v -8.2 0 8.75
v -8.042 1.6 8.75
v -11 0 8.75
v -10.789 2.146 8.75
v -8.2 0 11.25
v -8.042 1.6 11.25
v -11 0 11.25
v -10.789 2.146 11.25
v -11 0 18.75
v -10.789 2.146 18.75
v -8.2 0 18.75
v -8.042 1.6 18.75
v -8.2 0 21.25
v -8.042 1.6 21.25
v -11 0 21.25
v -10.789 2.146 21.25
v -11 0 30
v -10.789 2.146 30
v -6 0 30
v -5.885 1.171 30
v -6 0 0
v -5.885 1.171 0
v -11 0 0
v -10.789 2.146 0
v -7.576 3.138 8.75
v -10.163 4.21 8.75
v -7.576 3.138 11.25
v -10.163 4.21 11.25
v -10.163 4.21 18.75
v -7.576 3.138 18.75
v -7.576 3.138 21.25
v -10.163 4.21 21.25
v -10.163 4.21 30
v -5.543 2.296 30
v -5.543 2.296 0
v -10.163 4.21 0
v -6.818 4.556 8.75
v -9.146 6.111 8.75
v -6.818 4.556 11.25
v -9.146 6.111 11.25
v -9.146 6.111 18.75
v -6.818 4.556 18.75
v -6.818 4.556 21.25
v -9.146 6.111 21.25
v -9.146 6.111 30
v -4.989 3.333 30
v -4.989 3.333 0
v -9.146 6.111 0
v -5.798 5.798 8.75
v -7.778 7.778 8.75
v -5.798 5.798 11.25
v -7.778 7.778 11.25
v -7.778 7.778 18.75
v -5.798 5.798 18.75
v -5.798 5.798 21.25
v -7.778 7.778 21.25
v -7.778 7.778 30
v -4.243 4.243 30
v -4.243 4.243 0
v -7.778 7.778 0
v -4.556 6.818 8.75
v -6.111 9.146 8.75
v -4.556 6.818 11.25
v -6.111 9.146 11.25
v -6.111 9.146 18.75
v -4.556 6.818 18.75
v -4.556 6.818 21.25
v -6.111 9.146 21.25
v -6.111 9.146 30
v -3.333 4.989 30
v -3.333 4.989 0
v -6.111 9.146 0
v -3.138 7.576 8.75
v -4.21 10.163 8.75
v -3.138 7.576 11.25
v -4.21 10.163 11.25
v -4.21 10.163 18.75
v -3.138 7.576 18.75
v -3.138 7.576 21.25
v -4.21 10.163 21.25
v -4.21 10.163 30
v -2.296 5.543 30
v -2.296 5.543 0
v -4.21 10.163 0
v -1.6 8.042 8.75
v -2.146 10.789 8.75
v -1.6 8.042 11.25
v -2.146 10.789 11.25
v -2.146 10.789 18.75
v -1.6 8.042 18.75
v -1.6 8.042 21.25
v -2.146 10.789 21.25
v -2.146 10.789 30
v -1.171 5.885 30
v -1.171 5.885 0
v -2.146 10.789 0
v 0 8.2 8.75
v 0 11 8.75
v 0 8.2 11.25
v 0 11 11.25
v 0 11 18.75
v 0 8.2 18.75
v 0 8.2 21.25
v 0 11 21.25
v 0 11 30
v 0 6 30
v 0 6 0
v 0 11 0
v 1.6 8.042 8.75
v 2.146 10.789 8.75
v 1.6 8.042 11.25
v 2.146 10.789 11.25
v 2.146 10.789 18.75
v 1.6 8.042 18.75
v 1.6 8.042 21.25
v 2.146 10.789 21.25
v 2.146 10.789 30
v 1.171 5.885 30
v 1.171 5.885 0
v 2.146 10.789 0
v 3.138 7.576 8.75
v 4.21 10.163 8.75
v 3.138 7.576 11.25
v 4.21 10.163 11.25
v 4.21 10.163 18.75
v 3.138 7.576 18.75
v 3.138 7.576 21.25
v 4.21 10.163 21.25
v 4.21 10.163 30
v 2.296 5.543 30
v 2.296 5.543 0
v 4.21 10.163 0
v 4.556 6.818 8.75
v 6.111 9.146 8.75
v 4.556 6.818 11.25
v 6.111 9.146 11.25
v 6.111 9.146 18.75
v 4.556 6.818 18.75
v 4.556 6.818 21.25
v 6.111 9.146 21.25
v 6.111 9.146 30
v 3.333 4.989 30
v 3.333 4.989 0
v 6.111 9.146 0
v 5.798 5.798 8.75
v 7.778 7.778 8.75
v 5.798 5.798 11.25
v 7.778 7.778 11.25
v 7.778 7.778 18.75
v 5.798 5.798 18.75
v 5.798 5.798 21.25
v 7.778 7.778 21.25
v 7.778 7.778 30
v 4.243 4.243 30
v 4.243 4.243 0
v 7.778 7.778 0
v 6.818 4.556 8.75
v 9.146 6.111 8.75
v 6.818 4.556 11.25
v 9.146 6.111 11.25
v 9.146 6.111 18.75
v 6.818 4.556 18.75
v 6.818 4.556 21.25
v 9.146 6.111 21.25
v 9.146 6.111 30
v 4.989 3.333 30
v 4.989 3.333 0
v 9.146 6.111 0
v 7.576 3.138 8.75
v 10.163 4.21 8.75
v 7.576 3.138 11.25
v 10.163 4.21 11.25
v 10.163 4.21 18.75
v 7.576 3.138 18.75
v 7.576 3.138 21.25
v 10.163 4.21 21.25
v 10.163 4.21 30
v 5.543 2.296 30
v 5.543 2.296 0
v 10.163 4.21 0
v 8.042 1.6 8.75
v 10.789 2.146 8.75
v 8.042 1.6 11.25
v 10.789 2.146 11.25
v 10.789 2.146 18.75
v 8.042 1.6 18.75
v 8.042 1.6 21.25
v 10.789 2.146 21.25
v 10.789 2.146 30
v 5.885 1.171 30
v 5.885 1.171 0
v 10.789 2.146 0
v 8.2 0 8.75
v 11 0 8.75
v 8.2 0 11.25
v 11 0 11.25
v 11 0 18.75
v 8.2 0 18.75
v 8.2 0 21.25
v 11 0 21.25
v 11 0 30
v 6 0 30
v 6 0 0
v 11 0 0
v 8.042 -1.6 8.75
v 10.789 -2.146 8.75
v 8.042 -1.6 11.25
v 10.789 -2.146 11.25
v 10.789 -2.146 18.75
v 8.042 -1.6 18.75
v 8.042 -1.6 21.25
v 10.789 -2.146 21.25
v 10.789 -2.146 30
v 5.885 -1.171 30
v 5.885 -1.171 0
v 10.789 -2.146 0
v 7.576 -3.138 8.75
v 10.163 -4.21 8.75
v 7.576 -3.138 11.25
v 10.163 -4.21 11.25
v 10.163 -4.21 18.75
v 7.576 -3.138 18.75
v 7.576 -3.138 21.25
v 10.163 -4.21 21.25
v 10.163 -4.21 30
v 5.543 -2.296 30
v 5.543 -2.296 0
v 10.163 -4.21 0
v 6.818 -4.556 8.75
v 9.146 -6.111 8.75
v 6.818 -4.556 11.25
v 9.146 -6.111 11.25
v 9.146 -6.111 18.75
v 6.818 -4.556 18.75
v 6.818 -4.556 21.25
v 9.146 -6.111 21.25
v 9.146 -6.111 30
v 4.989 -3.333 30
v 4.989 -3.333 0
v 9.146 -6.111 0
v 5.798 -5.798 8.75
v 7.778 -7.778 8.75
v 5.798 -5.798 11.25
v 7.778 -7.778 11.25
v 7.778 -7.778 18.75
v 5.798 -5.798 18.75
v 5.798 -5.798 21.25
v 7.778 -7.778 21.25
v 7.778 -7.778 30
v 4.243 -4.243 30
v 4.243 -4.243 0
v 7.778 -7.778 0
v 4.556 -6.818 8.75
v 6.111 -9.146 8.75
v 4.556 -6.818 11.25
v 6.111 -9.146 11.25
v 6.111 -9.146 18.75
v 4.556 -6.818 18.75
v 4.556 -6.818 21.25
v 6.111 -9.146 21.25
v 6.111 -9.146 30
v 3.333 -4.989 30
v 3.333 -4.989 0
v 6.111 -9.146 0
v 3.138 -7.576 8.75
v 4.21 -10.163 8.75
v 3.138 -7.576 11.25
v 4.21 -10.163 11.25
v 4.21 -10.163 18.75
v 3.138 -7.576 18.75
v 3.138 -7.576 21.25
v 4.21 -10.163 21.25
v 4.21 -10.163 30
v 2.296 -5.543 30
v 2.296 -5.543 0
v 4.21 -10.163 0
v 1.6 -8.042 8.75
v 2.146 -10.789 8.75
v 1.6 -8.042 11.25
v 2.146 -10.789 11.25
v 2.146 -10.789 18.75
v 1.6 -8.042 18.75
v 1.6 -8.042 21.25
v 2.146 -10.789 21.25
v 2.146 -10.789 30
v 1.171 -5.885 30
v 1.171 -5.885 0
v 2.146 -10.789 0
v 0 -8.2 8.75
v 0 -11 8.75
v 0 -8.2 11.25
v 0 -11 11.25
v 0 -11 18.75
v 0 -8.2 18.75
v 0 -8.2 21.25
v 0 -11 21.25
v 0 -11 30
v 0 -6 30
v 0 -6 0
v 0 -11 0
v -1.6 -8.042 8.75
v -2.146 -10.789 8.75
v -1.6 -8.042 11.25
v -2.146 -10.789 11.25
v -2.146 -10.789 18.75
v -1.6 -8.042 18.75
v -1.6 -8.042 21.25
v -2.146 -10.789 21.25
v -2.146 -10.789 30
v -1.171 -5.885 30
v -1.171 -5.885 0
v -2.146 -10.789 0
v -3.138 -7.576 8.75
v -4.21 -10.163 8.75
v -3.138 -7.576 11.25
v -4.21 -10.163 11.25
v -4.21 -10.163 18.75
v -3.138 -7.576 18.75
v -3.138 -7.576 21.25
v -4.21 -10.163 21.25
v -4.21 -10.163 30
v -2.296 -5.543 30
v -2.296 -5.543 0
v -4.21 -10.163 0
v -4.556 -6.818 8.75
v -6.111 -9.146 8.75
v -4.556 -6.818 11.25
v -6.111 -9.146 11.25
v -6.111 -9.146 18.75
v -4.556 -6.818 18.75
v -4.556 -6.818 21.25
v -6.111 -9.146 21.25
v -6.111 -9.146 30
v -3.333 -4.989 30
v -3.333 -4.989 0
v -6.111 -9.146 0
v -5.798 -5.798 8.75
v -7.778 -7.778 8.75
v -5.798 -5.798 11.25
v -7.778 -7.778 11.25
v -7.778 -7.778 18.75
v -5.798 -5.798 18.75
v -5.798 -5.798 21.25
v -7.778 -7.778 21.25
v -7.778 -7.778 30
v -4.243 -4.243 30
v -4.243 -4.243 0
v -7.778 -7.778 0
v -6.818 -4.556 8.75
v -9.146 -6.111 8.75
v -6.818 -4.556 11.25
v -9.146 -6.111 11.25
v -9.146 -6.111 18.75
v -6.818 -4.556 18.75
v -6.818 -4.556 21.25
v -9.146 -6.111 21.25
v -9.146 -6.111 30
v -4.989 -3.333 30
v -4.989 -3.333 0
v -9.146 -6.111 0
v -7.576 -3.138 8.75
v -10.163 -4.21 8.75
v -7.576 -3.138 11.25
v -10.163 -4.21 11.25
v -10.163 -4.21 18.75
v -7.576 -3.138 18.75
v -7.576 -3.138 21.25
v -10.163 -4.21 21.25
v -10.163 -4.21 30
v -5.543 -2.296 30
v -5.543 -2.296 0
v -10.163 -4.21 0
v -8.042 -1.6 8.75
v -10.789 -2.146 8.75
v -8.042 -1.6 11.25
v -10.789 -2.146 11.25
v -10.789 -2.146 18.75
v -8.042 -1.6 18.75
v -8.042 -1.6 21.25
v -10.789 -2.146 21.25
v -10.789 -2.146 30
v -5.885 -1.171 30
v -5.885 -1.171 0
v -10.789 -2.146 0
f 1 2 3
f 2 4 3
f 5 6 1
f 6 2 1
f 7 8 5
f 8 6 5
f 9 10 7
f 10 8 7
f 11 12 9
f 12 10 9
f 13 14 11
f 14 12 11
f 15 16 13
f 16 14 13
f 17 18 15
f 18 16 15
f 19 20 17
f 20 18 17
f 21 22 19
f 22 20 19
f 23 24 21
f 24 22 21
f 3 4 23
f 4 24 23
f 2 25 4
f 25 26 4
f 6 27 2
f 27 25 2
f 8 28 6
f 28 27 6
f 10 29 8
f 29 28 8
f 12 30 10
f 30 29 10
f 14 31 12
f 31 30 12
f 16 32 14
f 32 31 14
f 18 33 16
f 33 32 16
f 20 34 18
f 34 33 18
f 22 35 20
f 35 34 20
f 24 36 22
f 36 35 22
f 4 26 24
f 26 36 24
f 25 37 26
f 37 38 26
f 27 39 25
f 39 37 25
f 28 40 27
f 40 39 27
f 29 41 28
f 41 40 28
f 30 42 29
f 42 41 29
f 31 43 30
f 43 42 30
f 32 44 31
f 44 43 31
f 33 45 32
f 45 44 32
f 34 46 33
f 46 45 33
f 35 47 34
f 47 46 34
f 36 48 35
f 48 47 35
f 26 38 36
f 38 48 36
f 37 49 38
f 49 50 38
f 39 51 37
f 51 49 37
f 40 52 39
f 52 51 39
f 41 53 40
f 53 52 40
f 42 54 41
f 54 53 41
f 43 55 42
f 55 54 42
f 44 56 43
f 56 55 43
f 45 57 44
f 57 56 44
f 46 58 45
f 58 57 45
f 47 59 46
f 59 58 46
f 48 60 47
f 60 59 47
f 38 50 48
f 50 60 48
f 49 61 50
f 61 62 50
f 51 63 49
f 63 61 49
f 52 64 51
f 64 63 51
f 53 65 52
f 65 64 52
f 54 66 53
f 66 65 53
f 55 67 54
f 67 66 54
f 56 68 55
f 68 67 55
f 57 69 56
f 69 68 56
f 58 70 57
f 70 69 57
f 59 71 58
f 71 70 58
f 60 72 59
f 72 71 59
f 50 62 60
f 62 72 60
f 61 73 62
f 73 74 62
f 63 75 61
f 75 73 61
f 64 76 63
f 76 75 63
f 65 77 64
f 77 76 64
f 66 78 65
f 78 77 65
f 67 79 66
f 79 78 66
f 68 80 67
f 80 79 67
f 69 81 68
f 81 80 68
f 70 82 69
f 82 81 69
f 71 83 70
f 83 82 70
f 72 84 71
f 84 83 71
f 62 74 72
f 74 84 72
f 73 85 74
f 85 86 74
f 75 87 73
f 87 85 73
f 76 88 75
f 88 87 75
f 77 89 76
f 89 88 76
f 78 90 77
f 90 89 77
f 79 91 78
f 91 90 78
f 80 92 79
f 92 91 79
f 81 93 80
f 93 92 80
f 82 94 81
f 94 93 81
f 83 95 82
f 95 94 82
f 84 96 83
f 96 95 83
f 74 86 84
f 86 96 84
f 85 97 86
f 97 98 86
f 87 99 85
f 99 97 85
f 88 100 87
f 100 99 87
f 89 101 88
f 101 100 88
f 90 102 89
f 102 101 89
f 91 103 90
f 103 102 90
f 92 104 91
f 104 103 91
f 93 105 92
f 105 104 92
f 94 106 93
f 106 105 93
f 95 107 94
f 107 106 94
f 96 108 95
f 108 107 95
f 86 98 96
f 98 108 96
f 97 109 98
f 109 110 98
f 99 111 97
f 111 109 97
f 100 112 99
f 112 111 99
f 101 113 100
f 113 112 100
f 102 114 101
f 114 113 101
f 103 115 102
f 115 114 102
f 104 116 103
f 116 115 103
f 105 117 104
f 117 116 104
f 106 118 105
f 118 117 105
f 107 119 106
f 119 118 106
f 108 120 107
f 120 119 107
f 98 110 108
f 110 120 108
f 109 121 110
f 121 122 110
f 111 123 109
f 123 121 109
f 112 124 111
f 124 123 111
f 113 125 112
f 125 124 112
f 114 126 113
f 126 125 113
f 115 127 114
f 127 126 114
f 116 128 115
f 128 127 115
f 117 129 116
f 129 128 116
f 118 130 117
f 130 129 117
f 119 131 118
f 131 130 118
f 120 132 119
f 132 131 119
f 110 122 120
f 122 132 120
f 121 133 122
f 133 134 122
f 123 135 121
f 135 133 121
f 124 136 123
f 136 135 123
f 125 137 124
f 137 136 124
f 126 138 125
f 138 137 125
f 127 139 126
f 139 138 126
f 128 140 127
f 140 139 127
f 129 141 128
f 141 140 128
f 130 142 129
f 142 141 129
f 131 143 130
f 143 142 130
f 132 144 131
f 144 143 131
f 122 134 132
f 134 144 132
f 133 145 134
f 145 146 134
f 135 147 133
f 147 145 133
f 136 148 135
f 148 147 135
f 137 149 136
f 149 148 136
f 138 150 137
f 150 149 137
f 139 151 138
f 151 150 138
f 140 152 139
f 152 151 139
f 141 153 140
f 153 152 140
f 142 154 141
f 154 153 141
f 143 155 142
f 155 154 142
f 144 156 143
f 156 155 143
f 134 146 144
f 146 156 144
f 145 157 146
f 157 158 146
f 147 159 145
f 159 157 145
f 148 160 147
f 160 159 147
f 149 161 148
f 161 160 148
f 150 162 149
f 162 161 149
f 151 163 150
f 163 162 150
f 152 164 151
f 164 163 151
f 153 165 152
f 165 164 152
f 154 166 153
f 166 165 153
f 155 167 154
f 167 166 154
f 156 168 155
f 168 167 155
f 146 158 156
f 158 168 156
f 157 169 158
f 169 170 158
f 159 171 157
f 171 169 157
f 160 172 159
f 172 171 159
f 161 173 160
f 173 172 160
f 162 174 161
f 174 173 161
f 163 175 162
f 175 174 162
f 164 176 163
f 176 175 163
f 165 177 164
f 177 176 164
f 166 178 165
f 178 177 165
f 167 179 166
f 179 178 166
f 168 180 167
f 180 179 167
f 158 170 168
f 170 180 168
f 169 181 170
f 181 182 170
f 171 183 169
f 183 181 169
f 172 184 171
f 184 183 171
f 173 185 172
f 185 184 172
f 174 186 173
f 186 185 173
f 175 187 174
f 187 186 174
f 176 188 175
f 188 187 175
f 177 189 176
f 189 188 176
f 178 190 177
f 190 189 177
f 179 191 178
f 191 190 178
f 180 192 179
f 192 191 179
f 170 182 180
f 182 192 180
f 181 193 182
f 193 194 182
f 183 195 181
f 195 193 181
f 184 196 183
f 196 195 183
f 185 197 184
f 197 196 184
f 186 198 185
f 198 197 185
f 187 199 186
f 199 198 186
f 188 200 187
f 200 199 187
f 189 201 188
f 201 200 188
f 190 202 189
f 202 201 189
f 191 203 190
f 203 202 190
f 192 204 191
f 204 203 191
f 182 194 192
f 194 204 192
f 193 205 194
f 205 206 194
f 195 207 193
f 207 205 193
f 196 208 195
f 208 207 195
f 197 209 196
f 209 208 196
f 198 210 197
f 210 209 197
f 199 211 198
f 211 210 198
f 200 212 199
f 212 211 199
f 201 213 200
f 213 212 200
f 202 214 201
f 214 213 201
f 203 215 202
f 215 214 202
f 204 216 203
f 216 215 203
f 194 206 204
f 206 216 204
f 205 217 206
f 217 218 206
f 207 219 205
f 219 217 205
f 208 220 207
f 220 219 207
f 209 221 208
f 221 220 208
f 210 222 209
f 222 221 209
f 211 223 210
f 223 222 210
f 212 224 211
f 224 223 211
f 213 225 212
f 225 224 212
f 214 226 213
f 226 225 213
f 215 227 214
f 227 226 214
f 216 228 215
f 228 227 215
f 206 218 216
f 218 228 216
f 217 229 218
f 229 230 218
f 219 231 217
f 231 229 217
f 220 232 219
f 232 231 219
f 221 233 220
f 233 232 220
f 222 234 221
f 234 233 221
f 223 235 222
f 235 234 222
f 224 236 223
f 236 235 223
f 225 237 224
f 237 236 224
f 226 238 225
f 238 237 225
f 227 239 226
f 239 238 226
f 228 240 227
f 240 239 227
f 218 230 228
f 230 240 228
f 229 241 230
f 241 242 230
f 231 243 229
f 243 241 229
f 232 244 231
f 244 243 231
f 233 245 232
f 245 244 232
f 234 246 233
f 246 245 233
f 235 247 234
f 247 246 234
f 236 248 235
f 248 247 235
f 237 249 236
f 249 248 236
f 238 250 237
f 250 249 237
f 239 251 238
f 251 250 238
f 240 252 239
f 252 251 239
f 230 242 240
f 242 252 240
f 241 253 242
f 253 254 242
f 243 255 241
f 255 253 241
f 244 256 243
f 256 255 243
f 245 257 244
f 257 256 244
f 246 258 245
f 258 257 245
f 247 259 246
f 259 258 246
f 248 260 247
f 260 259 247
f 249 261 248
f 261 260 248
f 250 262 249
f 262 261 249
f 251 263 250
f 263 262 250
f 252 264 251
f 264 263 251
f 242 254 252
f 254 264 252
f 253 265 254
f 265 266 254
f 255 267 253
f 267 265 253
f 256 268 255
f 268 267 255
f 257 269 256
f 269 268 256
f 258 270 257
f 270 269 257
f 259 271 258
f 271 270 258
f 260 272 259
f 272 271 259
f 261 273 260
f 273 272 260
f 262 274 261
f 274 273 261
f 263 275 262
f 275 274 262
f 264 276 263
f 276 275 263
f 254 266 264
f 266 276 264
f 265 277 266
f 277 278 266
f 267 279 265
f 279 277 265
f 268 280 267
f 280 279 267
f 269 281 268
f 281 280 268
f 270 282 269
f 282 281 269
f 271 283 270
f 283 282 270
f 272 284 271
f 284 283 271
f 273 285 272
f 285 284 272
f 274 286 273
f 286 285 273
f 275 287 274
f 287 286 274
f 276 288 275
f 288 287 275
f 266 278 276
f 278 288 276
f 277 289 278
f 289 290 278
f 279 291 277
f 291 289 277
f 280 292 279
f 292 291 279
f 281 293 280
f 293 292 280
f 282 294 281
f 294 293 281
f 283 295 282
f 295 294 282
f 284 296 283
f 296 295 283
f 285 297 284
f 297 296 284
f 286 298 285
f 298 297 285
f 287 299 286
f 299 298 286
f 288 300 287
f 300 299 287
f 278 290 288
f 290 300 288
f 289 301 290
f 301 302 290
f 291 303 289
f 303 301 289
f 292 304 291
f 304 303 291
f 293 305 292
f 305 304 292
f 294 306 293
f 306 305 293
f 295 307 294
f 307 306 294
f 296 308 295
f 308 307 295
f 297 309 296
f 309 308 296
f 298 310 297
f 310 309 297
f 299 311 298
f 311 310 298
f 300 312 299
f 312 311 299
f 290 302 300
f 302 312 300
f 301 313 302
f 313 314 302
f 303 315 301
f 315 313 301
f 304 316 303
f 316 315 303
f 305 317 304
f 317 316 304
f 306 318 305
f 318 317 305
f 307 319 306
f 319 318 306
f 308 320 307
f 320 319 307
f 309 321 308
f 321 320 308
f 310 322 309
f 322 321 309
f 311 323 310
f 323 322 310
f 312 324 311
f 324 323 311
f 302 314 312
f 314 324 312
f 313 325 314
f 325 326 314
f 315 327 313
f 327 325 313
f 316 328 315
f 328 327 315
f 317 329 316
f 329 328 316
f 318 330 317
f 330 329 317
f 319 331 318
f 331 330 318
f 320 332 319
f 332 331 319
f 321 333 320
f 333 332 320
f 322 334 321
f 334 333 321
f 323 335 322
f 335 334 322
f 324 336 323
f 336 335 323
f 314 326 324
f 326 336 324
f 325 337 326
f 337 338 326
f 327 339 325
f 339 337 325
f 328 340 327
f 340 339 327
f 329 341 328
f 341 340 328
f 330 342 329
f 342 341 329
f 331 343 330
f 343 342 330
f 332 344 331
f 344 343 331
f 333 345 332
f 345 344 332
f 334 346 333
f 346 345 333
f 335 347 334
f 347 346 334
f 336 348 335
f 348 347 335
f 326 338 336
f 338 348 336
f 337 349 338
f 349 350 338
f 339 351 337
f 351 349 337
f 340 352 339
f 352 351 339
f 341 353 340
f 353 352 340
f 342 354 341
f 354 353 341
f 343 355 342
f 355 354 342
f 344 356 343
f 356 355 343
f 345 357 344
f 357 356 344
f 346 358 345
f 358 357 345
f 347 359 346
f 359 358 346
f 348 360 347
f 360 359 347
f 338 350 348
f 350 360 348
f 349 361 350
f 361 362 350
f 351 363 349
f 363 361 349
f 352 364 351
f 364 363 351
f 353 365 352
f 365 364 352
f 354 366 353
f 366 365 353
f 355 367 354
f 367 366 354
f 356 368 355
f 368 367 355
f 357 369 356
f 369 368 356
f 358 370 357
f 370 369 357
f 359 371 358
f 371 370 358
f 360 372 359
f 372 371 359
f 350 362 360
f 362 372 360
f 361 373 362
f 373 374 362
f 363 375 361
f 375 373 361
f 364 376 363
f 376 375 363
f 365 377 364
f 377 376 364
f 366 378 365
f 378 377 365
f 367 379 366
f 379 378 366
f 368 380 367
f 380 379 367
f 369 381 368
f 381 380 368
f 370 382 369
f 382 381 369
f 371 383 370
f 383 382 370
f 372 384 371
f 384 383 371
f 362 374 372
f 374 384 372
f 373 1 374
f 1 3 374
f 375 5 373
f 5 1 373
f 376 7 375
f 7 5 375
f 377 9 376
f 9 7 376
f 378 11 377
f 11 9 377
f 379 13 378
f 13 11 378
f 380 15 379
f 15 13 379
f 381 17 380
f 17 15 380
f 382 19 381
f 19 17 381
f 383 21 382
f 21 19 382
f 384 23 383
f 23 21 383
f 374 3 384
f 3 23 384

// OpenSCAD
$fn = 32;

// ----------------------------------------------------------------------
// Grooved revolve: plain_grooves, bore R6
// ----------------------------------------------------------------------

// --- parameters (mm) ---
bore_r = 6;               // bore radius
outer_r = 11;             // outer radius of the body
total_h = 30;             // overall height, Z
wall = 5;                 // radial wall thickness
groove_w = 2.5;           // groove width
groove_d = 2.8;           // groove depth
grooves = 2;              // number of outer grooves

bbox_x = 2 * outer_r;  // full diameter
bore_d = 2 * bore_r;  // bore diameter
body_d = 2 * outer_r;  // body diameter
revolve_angle = 360;  // full turn around the Z axis

profile = [[6, 0], [11, 0], [11, 8.75], [8.2, 8.75], [8.2, 11.25], [11, 11.25], [11, 18.75], [8.2, 18.75], [8.2, 21.25], [11, 21.25], [11, 30], [6, 30]];  // primary outline, 12 points, counter clockwise

// --- the one profile operation ---
rotate_extrude(angle = revolve_angle) polygon(points = profile);
